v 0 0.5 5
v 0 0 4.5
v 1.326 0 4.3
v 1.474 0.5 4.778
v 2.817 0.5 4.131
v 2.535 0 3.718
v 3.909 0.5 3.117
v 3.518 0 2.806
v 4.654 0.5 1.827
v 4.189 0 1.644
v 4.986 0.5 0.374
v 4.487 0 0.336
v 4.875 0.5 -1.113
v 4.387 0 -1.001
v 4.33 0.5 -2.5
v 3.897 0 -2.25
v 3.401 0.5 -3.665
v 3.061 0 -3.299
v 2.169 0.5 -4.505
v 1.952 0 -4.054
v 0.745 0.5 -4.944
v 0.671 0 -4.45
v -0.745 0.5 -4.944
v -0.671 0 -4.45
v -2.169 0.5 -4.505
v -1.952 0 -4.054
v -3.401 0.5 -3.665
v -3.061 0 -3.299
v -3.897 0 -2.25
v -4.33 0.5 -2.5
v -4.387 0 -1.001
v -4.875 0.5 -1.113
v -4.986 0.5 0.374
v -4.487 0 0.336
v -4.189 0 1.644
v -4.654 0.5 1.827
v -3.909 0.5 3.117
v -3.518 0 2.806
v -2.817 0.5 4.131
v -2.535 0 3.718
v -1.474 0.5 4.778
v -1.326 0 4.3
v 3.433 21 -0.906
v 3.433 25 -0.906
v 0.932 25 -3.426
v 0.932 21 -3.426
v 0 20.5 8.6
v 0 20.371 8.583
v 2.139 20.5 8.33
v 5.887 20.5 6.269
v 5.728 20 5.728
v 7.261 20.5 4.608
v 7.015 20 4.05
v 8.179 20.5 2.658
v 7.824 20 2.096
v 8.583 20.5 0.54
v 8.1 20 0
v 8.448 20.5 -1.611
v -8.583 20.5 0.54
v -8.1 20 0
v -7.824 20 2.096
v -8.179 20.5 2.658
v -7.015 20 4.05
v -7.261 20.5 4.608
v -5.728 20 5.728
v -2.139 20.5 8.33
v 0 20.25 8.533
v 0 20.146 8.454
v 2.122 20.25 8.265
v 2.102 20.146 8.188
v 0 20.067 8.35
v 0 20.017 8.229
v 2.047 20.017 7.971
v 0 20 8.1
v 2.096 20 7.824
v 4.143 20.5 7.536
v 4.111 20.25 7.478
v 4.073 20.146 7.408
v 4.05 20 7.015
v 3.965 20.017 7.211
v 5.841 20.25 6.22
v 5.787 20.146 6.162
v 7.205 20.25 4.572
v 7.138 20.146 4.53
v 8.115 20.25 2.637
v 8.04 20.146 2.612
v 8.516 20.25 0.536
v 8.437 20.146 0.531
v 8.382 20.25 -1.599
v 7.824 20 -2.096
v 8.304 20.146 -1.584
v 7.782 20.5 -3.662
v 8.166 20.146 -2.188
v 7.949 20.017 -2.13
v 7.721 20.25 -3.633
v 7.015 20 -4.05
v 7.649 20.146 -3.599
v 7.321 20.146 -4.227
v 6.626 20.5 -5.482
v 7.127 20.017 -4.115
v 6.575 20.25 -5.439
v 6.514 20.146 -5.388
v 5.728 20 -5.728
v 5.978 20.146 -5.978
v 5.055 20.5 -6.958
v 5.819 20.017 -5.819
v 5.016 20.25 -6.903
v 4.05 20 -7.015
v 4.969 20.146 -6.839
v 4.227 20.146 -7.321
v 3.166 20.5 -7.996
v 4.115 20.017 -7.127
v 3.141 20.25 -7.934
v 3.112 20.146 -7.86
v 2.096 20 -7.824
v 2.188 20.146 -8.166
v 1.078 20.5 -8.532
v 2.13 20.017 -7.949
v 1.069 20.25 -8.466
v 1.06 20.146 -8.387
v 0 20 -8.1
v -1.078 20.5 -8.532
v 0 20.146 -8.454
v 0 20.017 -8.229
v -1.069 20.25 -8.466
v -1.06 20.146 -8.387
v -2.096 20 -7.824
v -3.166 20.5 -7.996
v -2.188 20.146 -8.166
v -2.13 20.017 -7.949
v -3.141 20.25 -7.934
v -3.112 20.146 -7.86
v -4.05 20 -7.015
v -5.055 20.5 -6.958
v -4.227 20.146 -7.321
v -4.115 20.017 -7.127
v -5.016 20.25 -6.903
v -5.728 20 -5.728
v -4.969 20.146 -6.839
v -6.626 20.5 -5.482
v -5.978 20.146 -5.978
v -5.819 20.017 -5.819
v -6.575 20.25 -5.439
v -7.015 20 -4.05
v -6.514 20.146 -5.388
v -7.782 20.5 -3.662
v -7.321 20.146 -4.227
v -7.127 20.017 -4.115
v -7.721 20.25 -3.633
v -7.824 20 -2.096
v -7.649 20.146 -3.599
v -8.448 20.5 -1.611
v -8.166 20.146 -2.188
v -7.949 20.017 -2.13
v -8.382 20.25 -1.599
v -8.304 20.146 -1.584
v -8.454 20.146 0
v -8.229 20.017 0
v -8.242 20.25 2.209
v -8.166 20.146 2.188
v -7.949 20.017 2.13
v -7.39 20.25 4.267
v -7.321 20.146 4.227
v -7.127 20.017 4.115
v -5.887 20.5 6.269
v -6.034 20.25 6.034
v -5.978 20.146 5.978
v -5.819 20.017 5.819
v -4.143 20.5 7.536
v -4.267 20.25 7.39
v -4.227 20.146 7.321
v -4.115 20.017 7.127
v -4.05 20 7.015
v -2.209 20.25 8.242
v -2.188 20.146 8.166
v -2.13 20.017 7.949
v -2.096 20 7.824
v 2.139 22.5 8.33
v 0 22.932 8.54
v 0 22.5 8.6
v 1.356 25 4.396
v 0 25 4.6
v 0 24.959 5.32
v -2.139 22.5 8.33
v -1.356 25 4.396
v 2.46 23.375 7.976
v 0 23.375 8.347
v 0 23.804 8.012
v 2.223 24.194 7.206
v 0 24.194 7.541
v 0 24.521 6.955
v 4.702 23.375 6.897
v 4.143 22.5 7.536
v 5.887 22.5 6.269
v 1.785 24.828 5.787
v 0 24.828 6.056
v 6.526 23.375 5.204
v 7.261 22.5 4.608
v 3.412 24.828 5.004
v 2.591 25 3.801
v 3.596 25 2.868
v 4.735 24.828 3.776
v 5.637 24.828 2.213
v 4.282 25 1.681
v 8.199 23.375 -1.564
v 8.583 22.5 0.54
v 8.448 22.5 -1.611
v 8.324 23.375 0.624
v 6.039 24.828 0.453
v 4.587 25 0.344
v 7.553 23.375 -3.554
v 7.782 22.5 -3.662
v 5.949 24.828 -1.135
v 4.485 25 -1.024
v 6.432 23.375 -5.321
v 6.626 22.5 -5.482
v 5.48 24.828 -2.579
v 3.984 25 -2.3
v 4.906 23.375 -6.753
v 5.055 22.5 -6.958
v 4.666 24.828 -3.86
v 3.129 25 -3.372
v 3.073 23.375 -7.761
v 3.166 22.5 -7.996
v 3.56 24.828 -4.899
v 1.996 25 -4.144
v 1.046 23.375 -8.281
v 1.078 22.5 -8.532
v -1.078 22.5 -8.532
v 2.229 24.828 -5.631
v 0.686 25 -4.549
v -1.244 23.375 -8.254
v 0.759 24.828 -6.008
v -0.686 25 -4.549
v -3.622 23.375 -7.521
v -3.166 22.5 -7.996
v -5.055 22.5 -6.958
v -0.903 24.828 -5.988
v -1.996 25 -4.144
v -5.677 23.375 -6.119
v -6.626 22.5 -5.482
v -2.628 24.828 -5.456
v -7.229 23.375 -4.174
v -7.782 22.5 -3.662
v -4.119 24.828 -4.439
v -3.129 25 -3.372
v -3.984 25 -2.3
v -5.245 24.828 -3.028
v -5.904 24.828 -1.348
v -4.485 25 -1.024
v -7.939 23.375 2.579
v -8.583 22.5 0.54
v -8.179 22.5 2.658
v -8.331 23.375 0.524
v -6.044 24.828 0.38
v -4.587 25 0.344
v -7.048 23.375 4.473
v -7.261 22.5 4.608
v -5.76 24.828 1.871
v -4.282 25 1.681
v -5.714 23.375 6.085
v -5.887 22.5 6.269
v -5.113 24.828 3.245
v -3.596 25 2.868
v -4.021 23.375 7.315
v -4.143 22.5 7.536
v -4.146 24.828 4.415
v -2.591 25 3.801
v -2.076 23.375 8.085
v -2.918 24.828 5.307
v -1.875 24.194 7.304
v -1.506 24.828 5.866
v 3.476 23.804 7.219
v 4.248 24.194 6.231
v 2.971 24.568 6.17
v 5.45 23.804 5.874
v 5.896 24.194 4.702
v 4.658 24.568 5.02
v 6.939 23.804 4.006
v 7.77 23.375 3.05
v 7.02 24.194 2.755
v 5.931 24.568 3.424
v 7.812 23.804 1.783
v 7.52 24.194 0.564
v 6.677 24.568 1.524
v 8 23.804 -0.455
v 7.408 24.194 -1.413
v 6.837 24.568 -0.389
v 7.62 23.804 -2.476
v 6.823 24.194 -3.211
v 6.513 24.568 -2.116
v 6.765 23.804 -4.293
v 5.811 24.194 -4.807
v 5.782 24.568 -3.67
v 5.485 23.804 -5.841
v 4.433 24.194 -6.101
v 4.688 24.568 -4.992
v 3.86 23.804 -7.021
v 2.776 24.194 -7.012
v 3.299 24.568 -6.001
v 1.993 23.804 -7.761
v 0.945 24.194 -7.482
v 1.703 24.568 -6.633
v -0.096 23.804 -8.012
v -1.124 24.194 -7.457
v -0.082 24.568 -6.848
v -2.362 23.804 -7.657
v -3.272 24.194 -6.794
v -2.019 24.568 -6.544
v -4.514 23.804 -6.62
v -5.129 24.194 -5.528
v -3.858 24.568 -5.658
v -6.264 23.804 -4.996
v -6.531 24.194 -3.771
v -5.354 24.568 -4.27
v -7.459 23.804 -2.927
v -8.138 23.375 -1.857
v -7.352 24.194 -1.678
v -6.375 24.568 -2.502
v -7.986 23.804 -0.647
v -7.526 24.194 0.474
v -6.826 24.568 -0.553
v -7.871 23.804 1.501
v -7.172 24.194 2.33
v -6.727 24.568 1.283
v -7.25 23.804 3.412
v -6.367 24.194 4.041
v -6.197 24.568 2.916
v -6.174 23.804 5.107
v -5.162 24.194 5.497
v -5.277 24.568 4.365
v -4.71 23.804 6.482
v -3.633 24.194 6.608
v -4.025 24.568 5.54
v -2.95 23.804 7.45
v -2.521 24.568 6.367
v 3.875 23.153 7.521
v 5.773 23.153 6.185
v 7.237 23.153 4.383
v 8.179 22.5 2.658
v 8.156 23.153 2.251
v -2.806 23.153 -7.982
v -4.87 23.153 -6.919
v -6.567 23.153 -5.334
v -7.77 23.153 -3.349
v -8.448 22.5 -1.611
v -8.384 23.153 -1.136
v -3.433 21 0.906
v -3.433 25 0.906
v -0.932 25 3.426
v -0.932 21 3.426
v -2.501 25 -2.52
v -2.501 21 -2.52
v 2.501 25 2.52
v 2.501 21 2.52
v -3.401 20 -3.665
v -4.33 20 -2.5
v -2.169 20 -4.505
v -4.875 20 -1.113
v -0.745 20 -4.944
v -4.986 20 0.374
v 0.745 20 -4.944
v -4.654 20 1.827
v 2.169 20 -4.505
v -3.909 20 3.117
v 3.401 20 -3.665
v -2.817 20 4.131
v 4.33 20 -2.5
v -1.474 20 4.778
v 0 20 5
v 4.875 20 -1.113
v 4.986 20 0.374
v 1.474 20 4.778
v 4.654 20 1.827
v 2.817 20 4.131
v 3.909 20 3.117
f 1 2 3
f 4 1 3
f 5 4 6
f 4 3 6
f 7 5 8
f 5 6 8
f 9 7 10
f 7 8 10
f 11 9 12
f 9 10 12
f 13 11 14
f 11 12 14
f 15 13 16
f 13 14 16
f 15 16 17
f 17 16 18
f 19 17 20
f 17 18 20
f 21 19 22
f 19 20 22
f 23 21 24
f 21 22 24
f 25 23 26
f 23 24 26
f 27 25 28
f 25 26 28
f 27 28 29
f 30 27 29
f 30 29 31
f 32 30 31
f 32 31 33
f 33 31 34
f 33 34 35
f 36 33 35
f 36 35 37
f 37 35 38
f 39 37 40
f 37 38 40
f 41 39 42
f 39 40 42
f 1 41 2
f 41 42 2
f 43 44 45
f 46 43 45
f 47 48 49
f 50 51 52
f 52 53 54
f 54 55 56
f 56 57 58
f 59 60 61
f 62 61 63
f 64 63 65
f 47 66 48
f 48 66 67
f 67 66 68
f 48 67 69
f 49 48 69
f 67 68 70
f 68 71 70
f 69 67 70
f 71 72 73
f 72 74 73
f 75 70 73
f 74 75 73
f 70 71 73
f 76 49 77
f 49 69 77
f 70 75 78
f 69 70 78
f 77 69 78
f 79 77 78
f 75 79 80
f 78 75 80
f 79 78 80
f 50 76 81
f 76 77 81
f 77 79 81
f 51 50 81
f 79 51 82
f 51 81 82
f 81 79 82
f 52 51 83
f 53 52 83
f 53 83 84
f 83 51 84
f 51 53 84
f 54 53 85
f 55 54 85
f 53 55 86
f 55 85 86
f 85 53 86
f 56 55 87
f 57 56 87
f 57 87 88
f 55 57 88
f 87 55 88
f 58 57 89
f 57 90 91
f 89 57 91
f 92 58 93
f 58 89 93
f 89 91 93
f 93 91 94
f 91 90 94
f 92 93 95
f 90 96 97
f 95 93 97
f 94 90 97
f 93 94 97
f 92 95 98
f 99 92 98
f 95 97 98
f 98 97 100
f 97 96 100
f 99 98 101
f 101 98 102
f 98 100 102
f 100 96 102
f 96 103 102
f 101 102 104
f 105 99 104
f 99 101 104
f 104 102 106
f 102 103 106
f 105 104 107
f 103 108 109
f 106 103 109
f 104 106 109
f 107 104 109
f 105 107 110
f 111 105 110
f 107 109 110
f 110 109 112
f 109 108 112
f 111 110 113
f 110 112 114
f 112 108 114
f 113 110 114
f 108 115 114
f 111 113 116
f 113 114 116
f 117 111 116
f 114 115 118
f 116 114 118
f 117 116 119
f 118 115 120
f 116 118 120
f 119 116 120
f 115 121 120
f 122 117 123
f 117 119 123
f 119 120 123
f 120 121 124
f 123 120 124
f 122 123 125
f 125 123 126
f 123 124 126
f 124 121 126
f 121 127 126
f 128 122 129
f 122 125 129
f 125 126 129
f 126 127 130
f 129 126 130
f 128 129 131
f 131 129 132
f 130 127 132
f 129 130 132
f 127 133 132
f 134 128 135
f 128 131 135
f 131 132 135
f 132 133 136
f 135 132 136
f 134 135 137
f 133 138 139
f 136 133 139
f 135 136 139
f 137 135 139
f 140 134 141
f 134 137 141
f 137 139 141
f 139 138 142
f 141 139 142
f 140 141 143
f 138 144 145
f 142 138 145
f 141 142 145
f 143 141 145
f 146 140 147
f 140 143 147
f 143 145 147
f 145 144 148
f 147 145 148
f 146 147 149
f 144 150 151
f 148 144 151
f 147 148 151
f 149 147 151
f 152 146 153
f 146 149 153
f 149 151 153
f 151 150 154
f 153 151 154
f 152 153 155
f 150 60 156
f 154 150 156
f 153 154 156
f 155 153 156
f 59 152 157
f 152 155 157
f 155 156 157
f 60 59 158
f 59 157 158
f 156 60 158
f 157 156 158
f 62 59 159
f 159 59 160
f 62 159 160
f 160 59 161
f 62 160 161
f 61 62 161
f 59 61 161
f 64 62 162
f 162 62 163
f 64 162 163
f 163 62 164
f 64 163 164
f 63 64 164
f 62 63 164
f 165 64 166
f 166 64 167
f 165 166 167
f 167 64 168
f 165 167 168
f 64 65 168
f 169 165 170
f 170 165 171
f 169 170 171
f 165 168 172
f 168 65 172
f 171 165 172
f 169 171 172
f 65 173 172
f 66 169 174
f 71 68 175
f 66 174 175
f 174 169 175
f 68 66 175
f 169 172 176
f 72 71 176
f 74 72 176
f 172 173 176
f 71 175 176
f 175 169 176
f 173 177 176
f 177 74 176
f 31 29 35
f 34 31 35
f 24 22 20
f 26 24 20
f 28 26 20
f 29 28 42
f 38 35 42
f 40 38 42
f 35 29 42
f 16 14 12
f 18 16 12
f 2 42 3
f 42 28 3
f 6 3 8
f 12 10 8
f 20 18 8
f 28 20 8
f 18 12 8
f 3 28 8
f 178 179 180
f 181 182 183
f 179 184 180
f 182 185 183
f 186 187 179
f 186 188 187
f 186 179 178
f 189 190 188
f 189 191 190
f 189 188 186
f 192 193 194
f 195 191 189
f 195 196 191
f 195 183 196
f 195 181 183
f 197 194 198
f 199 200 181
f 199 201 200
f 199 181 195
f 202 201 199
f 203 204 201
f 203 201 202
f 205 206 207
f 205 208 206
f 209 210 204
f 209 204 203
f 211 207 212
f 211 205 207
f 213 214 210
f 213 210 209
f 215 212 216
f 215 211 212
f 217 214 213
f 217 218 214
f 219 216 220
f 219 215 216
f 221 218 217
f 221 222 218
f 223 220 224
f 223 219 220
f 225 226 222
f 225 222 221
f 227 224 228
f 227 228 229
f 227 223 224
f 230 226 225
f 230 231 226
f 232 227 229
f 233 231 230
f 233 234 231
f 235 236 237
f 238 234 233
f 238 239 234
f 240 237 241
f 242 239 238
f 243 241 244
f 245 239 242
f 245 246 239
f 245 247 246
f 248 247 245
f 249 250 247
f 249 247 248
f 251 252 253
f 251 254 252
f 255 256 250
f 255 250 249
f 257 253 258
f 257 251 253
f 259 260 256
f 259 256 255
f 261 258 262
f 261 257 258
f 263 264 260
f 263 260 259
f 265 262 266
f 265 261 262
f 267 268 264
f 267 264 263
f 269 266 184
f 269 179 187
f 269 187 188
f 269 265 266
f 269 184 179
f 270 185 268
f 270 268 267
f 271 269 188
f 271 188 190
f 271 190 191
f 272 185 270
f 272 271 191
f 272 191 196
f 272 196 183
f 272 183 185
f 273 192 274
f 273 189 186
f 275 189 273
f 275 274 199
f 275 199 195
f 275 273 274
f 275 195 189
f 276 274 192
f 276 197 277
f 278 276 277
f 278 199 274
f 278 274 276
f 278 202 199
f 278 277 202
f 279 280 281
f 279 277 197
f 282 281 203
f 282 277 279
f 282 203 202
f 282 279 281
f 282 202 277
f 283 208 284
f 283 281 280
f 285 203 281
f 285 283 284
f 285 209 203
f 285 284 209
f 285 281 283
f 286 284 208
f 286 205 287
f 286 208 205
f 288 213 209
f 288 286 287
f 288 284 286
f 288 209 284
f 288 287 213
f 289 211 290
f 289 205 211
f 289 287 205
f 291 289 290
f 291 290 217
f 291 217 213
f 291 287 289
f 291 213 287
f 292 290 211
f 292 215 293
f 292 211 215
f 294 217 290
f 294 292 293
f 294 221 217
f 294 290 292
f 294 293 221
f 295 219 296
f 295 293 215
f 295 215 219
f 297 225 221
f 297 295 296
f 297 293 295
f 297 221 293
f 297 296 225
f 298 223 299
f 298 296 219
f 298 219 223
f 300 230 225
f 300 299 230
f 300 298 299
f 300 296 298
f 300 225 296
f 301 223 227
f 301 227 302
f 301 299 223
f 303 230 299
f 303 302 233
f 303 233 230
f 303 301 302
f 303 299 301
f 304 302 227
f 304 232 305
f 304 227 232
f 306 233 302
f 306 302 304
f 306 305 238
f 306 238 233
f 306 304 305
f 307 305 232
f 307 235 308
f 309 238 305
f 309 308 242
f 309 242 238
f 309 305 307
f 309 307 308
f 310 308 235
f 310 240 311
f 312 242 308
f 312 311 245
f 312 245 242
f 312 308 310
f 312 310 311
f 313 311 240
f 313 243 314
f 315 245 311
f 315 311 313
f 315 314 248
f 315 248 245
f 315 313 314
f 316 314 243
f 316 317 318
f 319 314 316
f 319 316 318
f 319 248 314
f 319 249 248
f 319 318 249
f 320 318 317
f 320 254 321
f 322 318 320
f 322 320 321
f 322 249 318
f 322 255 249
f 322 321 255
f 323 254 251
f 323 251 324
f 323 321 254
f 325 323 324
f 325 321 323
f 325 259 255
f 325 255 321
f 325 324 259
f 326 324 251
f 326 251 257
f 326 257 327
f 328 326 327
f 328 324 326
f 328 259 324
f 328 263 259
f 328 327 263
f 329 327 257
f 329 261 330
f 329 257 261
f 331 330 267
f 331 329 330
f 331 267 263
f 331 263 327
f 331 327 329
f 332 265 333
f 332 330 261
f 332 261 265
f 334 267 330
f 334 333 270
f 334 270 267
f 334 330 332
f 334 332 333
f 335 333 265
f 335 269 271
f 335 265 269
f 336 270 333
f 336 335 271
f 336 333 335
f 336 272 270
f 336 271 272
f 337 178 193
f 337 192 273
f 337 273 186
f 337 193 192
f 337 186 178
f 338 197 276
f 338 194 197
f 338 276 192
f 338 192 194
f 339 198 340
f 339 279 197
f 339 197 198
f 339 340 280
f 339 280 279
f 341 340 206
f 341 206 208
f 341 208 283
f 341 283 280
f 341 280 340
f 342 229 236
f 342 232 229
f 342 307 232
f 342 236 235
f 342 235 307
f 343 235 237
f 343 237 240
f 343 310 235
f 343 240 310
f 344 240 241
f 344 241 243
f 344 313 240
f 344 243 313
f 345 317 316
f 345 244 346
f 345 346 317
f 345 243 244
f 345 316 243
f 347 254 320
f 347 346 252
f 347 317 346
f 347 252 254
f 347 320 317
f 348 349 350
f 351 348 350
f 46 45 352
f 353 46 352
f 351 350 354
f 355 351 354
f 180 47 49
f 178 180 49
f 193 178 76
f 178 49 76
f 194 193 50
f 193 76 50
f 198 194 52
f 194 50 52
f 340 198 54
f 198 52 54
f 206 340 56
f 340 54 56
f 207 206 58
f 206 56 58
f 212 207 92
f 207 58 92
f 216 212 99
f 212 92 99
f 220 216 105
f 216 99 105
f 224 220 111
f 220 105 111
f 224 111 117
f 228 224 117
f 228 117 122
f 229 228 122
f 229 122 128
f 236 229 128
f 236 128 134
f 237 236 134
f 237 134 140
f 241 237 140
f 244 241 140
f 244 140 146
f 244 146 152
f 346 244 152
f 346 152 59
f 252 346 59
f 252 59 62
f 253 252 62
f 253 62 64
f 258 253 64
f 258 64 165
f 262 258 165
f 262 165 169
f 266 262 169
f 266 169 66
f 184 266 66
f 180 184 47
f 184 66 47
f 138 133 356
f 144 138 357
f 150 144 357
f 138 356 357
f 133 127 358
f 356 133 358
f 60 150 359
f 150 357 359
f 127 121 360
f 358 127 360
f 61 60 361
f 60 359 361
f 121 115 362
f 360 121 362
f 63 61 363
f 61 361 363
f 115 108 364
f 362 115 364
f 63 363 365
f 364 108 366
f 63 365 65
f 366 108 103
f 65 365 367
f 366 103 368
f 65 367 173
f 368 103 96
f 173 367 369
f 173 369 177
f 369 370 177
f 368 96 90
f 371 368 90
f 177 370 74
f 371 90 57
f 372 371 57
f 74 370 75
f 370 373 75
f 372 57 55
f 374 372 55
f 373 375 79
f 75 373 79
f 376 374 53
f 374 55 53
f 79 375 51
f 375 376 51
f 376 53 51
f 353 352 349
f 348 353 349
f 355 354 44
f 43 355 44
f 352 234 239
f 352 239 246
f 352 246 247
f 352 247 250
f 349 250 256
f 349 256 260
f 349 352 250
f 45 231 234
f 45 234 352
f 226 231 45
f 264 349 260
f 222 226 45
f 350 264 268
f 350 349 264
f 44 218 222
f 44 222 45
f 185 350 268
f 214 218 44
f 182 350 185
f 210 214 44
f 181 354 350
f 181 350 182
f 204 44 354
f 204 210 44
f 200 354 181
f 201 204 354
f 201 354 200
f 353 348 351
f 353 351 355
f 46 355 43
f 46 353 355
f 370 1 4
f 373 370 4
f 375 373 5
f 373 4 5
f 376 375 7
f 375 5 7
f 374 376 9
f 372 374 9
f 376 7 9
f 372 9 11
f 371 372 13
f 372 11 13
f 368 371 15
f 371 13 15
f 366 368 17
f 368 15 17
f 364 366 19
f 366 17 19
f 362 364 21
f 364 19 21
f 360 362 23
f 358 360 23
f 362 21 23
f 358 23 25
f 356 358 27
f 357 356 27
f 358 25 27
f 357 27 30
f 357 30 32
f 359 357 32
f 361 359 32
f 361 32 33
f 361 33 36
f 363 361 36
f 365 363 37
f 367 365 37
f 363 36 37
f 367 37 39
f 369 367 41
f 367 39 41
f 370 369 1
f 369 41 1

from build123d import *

# Parameters (mm, degrees)
SKETCH1_R           = 5
BOSS_EXTRUDE1_DEPTH = 20
SKETCH2_R           = 8.6
BOSS_EXTRUDE2_DEPTH = 5
FILLET1_SIZE        = 2.5
FILLET1_SIZE_2      = 4
CUT_EXTRUDE1_DEPTH  = 4
FILLET2_R           = 0.5
CHAMFER1_SIZE       = 0.5


with BuildPart() as part:
    # Sketch1 → Boss-Extrude1 (new body)
    with BuildSketch(Plane(origin=(0, 0, 0), x_dir=(1, 0, 0), z_dir=(0, 1, 0))):
        with Locations(Location((0, 0, 0), (0, 0, 270))):
            Circle(SKETCH1_R)
    extrude(amount=BOSS_EXTRUDE1_DEPTH)

    # Sketch2 → Boss-Extrude2 (add)
    with BuildSketch(Plane(origin=(0, 20, 0), x_dir=(1, 0, 0), z_dir=(0, 1, 0))):
        with Locations(Location((0, 0, 0), (0, 0, 270))):
            Circle(SKETCH2_R)
    extrude(amount=BOSS_EXTRUDE2_DEPTH)

    # Fillet1
    # an asymmetric fillet: 4, 2.5 mm, written as the material it takes off along each edge
    with BuildSketch(Plane(origin=(0, 25, 0), x_dir=(0, 0, 1), z_dir=(-1, 0, 0))) as fillet1_piece_1:
        with BuildLine():
            Bezier((8.6, -FILLET1_SIZE), (8.6, 0), (8.6 - FILLET1_SIZE_2, 0), weights=[1, 0.707106781, 1])
            Line((8.6 - FILLET1_SIZE_2, 0), (8.6, 0))
            Line((8.6, 0), (8.6, -FILLET1_SIZE))
        make_face()
    revolve(axis=Axis((0, 25, 0), (0, 1, 0)), mode=Mode.SUBTRACT)

    # Sketch3 → Cut-Extrude1 (cut)
    with BuildSketch(Plane(origin=(0, 25, 0), x_dir=(1, 0, 0), z_dir=(0, 1, 0))):
        Polygon((2.501014418, -2.520402127), (3.433239479, 0.905740958), (0.93222506, 3.426143085), (-2.501014418, 2.520402127), (-3.433239479, -0.905740958), (-0.93222506, -3.426143085), align=None)
    extrude(amount=-CUT_EXTRUDE1_DEPTH, mode=Mode.SUBTRACT)

    # Fillet2
    fillet2_edges = [part.edges().sort_by_distance(p)[0] for p in [
        (0, 20, -8.6),
    ]]
    fillet(fillet2_edges, radius=FILLET2_R)

    # Chamfer1
    chamfer1_edges = [part.edges().sort_by_distance(p)[0] for p in [
        (0, 0, -5),
    ]]
    chamfer(chamfer1_edges, length=CHAMFER1_SIZE)


solid = part.part
